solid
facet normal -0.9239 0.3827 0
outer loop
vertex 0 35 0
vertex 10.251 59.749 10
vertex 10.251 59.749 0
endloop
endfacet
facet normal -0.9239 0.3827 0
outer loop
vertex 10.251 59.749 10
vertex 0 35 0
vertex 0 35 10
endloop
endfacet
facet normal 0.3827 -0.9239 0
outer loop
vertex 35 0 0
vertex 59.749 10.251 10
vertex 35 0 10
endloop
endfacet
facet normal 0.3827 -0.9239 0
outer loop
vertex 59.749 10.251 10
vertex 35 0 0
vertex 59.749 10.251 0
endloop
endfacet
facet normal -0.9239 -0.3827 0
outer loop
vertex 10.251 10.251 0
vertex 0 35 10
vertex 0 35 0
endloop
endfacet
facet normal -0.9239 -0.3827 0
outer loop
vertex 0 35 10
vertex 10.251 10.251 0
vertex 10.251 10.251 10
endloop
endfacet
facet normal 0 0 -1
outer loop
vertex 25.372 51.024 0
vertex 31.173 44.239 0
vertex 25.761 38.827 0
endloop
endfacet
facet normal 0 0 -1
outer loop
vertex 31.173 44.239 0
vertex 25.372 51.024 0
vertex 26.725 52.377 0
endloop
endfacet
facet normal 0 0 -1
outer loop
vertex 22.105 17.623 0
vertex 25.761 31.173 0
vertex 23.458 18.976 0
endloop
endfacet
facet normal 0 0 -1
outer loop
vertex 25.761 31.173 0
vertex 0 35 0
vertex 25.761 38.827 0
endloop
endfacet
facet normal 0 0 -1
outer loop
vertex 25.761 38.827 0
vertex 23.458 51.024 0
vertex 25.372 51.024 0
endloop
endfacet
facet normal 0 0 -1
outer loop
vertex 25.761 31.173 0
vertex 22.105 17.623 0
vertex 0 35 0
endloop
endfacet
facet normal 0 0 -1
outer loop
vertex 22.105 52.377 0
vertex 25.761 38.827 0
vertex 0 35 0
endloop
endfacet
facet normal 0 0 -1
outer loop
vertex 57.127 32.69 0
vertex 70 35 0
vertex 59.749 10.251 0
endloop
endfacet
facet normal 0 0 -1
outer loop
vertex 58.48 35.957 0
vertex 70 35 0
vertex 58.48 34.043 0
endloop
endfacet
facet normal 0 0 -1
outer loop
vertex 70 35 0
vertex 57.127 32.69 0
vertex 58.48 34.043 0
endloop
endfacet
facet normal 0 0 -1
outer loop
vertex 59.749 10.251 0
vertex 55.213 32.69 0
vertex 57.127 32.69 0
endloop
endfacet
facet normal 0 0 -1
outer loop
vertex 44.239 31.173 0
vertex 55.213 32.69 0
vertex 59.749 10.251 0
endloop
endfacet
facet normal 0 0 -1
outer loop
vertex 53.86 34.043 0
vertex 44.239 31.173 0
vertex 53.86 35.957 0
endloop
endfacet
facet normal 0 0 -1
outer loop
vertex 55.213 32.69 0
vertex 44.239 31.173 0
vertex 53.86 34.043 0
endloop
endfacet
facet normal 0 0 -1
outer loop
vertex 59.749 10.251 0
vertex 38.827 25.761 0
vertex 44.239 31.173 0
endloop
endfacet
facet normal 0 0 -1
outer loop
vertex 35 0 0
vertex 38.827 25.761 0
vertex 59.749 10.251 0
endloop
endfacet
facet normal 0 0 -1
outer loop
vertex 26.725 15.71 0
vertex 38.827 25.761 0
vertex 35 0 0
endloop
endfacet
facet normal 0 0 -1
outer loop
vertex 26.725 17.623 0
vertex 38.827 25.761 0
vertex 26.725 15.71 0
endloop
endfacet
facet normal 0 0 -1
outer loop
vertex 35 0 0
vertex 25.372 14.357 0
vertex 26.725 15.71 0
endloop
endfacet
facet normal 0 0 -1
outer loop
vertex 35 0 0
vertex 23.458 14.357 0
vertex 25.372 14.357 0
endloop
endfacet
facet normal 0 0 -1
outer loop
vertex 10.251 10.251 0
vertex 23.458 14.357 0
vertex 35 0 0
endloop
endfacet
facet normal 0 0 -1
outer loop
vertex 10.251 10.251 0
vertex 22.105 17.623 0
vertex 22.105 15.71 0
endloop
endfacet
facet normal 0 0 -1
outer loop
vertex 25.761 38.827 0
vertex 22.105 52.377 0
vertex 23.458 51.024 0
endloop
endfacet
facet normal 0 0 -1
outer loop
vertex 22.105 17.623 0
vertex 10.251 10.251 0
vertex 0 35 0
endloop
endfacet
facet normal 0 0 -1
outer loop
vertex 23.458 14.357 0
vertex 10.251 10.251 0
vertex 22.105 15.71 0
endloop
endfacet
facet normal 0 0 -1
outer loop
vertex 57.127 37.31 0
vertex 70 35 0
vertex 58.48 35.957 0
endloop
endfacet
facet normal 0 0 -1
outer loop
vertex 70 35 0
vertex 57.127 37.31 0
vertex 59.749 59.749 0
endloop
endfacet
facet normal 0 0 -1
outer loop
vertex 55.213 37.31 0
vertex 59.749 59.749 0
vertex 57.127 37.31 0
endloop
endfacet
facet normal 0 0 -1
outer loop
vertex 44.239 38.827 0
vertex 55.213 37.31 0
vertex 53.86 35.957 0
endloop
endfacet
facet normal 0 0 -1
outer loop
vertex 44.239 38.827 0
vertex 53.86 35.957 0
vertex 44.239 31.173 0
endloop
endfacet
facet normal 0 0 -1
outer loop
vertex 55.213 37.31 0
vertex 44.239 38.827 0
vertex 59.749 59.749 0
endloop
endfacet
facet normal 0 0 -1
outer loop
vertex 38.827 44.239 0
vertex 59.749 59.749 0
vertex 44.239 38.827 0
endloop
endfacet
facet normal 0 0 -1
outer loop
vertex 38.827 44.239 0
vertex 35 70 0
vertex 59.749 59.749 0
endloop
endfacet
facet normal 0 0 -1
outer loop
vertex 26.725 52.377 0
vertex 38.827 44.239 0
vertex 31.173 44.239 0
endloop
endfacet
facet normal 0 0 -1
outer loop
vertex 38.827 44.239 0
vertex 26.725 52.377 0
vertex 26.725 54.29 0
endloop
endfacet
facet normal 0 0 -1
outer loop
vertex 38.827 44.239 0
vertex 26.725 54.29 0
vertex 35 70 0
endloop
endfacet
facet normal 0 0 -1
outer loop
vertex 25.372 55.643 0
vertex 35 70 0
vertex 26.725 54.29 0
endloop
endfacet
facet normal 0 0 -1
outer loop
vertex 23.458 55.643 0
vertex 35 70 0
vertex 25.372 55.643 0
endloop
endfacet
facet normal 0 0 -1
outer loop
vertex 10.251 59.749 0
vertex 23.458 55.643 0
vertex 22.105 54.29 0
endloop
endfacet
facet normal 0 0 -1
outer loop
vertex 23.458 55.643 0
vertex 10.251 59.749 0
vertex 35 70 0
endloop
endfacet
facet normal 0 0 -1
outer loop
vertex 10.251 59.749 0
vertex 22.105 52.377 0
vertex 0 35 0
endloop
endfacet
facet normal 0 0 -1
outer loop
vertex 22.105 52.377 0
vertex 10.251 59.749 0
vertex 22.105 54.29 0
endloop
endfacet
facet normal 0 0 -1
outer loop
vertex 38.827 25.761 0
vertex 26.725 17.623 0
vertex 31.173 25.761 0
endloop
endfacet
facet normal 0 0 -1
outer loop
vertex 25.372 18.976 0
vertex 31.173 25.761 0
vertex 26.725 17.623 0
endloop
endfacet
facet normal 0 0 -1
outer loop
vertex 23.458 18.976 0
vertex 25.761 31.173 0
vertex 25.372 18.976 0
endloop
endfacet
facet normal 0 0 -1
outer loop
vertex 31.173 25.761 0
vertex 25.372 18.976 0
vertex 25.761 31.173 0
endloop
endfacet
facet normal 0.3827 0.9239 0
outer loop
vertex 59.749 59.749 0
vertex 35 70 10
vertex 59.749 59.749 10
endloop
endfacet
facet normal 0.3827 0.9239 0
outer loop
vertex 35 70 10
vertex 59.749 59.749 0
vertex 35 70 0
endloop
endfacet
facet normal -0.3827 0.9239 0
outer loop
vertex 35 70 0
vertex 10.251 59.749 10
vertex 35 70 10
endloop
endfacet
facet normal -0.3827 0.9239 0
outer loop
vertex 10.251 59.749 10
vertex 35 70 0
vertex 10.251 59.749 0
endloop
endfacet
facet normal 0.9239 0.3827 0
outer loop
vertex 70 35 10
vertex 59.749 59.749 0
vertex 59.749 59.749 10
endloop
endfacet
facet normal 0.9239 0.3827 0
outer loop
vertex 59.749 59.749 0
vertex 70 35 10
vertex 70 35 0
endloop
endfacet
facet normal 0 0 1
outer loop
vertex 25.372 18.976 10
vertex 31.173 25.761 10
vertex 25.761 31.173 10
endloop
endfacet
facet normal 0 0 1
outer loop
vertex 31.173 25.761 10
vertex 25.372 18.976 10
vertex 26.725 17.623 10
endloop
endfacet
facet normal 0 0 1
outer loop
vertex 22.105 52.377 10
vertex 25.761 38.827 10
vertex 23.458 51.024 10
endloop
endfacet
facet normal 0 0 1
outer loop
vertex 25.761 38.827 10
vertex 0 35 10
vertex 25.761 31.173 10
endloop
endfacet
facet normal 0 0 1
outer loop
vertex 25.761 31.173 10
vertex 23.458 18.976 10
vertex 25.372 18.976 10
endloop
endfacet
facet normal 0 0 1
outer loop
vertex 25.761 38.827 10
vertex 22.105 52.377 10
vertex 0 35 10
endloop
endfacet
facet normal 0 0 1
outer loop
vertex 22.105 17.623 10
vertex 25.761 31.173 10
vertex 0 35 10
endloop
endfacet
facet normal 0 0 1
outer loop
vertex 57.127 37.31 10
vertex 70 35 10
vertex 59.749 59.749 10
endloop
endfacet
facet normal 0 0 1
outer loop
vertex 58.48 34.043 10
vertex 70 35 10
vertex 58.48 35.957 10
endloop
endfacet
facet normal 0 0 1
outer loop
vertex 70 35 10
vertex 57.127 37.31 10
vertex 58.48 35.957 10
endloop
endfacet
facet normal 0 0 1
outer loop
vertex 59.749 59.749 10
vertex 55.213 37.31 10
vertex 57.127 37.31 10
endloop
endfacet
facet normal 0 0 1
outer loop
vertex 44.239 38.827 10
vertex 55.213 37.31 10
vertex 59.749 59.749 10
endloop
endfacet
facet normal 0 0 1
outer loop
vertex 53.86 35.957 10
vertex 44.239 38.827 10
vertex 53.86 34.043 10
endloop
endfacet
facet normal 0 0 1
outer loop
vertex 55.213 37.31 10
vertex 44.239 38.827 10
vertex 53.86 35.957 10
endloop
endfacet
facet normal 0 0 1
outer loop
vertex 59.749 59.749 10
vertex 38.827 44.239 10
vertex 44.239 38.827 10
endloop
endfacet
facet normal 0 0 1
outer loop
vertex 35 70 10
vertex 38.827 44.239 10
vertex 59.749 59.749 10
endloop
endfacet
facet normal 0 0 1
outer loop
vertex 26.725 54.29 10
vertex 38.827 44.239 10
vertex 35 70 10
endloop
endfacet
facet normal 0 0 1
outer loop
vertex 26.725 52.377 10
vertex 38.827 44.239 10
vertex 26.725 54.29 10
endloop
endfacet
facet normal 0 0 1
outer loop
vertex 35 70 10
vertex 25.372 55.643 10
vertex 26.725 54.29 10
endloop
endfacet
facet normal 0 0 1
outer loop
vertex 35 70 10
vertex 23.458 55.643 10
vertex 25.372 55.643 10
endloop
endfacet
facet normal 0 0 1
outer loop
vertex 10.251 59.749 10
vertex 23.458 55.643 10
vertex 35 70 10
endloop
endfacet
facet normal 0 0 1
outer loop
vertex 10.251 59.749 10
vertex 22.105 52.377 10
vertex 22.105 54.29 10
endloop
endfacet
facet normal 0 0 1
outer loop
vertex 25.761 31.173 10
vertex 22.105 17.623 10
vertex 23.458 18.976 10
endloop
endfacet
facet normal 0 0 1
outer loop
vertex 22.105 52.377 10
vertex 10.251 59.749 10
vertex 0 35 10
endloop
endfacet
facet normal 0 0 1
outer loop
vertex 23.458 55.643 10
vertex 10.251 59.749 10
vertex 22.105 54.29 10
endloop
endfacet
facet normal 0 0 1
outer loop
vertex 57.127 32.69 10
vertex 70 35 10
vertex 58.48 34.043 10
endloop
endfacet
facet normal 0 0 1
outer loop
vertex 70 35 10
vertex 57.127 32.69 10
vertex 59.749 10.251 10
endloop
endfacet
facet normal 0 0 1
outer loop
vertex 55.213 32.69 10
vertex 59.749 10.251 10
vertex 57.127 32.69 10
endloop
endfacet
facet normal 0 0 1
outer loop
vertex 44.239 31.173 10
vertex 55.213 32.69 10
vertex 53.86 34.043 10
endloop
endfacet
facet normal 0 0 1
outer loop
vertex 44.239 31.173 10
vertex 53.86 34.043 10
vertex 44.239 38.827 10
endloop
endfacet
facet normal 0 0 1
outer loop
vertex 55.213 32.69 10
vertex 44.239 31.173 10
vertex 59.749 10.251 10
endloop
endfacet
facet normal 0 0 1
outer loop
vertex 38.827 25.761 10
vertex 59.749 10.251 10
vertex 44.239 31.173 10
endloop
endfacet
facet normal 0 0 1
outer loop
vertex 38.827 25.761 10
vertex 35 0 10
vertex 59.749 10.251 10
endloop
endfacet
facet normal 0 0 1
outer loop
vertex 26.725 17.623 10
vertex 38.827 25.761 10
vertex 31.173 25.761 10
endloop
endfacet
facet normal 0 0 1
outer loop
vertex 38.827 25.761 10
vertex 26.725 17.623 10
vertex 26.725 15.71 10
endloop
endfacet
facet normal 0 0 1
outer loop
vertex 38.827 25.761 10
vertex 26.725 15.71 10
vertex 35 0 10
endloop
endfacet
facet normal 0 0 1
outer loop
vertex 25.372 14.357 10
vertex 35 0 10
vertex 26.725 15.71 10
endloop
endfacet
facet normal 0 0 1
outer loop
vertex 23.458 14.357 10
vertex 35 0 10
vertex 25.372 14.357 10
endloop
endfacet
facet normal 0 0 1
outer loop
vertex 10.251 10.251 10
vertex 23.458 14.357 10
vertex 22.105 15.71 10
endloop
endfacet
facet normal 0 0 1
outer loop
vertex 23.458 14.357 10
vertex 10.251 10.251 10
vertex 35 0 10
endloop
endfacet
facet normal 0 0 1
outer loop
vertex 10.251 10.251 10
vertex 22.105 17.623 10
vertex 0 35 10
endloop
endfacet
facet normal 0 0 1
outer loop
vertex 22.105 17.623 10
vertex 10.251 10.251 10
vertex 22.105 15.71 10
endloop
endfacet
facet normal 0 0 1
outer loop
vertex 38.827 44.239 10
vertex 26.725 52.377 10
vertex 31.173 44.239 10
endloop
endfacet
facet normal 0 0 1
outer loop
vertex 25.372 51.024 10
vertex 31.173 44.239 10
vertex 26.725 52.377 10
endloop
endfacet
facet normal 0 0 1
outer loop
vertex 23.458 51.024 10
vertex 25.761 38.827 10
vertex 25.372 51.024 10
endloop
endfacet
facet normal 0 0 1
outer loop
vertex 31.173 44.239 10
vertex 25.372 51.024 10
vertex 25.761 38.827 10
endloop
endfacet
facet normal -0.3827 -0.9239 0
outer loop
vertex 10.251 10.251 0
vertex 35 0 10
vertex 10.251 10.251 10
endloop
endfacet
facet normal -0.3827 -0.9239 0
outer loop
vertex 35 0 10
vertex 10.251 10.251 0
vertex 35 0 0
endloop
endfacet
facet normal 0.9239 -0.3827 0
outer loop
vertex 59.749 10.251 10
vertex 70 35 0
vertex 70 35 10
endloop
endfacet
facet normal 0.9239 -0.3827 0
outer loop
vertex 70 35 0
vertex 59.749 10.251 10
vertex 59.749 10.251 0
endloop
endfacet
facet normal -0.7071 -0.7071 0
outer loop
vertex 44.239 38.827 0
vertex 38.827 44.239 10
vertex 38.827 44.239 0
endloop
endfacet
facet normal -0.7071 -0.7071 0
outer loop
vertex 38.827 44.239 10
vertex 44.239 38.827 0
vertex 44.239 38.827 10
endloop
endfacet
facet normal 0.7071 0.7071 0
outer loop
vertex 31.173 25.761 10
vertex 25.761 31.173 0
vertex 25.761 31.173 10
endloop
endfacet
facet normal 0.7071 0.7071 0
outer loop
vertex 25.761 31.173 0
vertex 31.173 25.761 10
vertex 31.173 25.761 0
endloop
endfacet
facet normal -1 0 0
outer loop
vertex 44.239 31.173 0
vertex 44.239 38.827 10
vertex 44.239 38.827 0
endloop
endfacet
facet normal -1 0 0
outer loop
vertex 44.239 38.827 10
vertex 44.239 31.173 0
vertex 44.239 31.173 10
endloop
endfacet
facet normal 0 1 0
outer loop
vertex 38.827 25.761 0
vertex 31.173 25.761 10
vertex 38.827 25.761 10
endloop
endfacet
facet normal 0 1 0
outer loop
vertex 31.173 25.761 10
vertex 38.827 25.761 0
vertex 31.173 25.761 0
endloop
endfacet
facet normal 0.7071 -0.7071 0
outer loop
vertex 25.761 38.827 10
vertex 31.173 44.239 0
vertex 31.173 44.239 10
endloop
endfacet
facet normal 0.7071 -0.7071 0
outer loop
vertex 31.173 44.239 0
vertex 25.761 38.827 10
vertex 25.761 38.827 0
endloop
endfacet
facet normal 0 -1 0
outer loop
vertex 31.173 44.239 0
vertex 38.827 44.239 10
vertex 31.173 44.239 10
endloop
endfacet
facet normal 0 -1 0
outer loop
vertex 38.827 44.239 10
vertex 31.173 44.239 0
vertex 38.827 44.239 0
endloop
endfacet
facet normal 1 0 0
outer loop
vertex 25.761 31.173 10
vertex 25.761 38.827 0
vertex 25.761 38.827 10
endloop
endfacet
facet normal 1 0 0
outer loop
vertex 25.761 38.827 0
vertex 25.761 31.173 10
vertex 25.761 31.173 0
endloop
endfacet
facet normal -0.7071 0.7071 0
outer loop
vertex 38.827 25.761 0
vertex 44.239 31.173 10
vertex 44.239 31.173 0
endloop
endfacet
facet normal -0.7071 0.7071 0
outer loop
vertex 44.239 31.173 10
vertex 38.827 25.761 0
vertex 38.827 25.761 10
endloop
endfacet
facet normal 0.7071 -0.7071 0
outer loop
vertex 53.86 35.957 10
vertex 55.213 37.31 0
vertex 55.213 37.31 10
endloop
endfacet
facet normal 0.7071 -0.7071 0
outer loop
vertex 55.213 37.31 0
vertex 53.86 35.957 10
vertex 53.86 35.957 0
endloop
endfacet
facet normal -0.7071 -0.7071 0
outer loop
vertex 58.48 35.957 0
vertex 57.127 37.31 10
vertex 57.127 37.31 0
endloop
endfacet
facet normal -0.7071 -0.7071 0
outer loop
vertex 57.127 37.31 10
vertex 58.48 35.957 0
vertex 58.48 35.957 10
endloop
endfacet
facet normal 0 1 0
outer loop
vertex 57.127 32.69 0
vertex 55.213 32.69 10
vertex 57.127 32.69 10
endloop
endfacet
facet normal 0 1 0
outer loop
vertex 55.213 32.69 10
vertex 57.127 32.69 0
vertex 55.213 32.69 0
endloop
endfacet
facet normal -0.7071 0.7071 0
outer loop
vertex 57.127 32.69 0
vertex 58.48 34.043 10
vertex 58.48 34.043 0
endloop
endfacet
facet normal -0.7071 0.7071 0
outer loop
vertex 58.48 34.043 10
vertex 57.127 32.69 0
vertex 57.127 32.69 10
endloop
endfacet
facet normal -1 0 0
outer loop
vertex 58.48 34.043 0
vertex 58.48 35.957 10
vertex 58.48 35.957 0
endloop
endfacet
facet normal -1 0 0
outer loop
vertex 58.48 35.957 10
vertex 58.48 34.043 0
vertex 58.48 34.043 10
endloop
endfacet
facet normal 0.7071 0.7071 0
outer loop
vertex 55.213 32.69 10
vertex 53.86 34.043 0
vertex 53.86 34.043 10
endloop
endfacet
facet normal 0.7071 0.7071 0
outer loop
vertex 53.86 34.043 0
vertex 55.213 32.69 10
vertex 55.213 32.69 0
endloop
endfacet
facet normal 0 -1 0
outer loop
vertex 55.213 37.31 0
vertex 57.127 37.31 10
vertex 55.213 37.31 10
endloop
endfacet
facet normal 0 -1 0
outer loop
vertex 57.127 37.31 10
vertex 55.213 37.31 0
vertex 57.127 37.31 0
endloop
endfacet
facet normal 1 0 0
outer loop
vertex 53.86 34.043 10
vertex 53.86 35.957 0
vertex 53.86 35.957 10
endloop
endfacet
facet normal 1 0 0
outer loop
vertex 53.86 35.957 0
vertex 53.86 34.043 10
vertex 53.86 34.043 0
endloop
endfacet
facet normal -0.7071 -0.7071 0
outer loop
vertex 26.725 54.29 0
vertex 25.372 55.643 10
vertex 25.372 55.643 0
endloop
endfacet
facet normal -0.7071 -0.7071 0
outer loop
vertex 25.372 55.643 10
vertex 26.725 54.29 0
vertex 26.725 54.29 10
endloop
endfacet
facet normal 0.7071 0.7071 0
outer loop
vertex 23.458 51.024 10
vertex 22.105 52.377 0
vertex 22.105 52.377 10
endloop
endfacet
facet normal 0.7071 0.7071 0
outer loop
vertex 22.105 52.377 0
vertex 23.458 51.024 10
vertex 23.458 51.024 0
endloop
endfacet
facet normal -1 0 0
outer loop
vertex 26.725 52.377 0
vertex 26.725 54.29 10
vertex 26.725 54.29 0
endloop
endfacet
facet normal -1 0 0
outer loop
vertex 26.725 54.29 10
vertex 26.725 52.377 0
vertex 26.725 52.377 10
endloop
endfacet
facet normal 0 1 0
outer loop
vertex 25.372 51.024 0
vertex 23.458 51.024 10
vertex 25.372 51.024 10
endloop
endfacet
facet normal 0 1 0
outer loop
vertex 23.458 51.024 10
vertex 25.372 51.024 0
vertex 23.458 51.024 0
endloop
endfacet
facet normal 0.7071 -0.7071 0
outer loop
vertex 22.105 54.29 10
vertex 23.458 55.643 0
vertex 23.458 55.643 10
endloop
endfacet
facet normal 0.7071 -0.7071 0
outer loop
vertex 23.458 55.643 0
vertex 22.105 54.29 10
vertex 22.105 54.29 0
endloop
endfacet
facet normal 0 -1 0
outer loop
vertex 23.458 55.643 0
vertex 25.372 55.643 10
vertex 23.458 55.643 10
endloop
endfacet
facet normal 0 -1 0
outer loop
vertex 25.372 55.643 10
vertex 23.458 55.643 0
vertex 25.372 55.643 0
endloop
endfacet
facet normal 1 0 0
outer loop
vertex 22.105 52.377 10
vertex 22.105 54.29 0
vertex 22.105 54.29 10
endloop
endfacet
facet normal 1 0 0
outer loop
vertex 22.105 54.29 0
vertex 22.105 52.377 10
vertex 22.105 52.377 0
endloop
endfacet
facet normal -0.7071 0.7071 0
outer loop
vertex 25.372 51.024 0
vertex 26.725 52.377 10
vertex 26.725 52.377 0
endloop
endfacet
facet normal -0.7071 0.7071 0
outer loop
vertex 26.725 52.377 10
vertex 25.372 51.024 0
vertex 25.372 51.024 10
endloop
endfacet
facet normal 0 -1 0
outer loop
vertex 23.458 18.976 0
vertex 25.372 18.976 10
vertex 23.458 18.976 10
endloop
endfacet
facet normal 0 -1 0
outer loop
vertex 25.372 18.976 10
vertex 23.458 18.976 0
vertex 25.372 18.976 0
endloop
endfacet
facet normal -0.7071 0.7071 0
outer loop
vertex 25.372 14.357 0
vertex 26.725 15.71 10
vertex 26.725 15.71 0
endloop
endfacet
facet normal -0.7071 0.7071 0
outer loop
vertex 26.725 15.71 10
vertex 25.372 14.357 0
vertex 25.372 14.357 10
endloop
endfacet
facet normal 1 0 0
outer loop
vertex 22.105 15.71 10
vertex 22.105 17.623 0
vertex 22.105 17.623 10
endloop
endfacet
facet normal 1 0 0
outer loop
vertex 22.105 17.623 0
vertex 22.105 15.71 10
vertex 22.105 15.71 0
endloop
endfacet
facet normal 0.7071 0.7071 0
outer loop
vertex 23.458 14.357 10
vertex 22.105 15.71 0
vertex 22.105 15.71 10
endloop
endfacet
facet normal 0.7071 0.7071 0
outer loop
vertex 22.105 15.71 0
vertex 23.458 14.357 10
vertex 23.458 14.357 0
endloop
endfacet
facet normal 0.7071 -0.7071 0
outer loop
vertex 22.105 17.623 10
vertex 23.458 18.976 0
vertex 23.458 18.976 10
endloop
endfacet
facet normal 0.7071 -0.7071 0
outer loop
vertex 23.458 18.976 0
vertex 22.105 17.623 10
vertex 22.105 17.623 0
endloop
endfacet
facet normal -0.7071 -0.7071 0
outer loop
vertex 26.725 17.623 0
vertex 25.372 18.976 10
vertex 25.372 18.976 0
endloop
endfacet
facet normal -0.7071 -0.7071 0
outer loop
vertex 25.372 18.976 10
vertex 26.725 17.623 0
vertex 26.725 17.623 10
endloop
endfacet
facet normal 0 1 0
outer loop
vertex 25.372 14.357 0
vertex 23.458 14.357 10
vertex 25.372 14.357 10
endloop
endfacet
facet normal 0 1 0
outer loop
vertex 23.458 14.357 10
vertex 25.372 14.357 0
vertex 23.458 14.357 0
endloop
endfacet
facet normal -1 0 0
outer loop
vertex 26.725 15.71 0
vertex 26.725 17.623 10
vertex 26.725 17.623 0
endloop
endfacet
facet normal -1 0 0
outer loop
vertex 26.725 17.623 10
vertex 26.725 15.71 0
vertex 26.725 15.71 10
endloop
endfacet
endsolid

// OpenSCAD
$fn = 32;

// ----------------------------------------------------------------------
// Polygon plate: 8-gon R35, 3 bolt windows
// ----------------------------------------------------------------------

// --- parameters (mm) ---
sides = 8;                // number of polygon sides
plate_r = 35;             // circumscribed radius of the polygon
bore_r = 10;              // centre bore radius
bolts = 3;                // number of bolt windows
ring_r = 21.17;           // bolt-circle radius
bolt_r = 2.5;             // bolt window radius
plate_t = 10;             // plate thickness, Z (extrusion height)

plate_d = 2 * plate_r;  // circumscribed diameter
bore_d = 2 * bore_r;  // centre bore diameter
bolt_d = 2 * bolt_r;  // bolt window diameter
ring_d = 2 * ring_r;  // bolt-circle diameter

profile = [[70, 35], [59.749, 59.749], [35, 70], [10.251, 59.749], [0, 35], [10.251, 10.251], [35, 0], [59.749, 10.251]];  // primary outline, 8 points, counter clockwise
void_1 = [[44.239, 38.827], [38.827, 44.239], [31.173, 44.239], [25.761, 38.827], [25.761, 31.173], [31.173, 25.761], [38.827, 25.761], [44.239, 31.173]];  // centre bore, 8 points
void_2 = [[58.48, 35.957], [57.127, 37.31], [55.213, 37.31], [53.86, 35.957], [53.86, 34.043], [55.213, 32.69], [57.127, 32.69], [58.48, 34.043]];  // bolt window 1, 8 points
void_3 = [[26.725, 54.29], [25.372, 55.643], [23.458, 55.643], [22.105, 54.29], [22.105, 52.377], [23.458, 51.024], [25.372, 51.024], [26.725, 52.377]];  // bolt window 2, 8 points
void_4 = [[26.725, 17.623], [25.372, 18.976], [23.458, 18.976], [22.105, 17.623], [22.105, 15.71], [23.458, 14.357], [25.372, 14.357], [26.725, 15.71]];  // bolt window 3, 8 points

// --- the one profile operation ---
difference() {
  linear_extrude(height = plate_t) polygon(points = profile);
  translate([0, 0, -1])
    linear_extrude(height = plate_t + 2) polygon(points = void_1);
  translate([0, 0, -1])
    linear_extrude(height = plate_t + 2) polygon(points = void_2);
  translate([0, 0, -1])
    linear_extrude(height = plate_t + 2) polygon(points = void_3);
  translate([0, 0, -1])
    linear_extrude(height = plate_t + 2) polygon(points = void_4);
}
